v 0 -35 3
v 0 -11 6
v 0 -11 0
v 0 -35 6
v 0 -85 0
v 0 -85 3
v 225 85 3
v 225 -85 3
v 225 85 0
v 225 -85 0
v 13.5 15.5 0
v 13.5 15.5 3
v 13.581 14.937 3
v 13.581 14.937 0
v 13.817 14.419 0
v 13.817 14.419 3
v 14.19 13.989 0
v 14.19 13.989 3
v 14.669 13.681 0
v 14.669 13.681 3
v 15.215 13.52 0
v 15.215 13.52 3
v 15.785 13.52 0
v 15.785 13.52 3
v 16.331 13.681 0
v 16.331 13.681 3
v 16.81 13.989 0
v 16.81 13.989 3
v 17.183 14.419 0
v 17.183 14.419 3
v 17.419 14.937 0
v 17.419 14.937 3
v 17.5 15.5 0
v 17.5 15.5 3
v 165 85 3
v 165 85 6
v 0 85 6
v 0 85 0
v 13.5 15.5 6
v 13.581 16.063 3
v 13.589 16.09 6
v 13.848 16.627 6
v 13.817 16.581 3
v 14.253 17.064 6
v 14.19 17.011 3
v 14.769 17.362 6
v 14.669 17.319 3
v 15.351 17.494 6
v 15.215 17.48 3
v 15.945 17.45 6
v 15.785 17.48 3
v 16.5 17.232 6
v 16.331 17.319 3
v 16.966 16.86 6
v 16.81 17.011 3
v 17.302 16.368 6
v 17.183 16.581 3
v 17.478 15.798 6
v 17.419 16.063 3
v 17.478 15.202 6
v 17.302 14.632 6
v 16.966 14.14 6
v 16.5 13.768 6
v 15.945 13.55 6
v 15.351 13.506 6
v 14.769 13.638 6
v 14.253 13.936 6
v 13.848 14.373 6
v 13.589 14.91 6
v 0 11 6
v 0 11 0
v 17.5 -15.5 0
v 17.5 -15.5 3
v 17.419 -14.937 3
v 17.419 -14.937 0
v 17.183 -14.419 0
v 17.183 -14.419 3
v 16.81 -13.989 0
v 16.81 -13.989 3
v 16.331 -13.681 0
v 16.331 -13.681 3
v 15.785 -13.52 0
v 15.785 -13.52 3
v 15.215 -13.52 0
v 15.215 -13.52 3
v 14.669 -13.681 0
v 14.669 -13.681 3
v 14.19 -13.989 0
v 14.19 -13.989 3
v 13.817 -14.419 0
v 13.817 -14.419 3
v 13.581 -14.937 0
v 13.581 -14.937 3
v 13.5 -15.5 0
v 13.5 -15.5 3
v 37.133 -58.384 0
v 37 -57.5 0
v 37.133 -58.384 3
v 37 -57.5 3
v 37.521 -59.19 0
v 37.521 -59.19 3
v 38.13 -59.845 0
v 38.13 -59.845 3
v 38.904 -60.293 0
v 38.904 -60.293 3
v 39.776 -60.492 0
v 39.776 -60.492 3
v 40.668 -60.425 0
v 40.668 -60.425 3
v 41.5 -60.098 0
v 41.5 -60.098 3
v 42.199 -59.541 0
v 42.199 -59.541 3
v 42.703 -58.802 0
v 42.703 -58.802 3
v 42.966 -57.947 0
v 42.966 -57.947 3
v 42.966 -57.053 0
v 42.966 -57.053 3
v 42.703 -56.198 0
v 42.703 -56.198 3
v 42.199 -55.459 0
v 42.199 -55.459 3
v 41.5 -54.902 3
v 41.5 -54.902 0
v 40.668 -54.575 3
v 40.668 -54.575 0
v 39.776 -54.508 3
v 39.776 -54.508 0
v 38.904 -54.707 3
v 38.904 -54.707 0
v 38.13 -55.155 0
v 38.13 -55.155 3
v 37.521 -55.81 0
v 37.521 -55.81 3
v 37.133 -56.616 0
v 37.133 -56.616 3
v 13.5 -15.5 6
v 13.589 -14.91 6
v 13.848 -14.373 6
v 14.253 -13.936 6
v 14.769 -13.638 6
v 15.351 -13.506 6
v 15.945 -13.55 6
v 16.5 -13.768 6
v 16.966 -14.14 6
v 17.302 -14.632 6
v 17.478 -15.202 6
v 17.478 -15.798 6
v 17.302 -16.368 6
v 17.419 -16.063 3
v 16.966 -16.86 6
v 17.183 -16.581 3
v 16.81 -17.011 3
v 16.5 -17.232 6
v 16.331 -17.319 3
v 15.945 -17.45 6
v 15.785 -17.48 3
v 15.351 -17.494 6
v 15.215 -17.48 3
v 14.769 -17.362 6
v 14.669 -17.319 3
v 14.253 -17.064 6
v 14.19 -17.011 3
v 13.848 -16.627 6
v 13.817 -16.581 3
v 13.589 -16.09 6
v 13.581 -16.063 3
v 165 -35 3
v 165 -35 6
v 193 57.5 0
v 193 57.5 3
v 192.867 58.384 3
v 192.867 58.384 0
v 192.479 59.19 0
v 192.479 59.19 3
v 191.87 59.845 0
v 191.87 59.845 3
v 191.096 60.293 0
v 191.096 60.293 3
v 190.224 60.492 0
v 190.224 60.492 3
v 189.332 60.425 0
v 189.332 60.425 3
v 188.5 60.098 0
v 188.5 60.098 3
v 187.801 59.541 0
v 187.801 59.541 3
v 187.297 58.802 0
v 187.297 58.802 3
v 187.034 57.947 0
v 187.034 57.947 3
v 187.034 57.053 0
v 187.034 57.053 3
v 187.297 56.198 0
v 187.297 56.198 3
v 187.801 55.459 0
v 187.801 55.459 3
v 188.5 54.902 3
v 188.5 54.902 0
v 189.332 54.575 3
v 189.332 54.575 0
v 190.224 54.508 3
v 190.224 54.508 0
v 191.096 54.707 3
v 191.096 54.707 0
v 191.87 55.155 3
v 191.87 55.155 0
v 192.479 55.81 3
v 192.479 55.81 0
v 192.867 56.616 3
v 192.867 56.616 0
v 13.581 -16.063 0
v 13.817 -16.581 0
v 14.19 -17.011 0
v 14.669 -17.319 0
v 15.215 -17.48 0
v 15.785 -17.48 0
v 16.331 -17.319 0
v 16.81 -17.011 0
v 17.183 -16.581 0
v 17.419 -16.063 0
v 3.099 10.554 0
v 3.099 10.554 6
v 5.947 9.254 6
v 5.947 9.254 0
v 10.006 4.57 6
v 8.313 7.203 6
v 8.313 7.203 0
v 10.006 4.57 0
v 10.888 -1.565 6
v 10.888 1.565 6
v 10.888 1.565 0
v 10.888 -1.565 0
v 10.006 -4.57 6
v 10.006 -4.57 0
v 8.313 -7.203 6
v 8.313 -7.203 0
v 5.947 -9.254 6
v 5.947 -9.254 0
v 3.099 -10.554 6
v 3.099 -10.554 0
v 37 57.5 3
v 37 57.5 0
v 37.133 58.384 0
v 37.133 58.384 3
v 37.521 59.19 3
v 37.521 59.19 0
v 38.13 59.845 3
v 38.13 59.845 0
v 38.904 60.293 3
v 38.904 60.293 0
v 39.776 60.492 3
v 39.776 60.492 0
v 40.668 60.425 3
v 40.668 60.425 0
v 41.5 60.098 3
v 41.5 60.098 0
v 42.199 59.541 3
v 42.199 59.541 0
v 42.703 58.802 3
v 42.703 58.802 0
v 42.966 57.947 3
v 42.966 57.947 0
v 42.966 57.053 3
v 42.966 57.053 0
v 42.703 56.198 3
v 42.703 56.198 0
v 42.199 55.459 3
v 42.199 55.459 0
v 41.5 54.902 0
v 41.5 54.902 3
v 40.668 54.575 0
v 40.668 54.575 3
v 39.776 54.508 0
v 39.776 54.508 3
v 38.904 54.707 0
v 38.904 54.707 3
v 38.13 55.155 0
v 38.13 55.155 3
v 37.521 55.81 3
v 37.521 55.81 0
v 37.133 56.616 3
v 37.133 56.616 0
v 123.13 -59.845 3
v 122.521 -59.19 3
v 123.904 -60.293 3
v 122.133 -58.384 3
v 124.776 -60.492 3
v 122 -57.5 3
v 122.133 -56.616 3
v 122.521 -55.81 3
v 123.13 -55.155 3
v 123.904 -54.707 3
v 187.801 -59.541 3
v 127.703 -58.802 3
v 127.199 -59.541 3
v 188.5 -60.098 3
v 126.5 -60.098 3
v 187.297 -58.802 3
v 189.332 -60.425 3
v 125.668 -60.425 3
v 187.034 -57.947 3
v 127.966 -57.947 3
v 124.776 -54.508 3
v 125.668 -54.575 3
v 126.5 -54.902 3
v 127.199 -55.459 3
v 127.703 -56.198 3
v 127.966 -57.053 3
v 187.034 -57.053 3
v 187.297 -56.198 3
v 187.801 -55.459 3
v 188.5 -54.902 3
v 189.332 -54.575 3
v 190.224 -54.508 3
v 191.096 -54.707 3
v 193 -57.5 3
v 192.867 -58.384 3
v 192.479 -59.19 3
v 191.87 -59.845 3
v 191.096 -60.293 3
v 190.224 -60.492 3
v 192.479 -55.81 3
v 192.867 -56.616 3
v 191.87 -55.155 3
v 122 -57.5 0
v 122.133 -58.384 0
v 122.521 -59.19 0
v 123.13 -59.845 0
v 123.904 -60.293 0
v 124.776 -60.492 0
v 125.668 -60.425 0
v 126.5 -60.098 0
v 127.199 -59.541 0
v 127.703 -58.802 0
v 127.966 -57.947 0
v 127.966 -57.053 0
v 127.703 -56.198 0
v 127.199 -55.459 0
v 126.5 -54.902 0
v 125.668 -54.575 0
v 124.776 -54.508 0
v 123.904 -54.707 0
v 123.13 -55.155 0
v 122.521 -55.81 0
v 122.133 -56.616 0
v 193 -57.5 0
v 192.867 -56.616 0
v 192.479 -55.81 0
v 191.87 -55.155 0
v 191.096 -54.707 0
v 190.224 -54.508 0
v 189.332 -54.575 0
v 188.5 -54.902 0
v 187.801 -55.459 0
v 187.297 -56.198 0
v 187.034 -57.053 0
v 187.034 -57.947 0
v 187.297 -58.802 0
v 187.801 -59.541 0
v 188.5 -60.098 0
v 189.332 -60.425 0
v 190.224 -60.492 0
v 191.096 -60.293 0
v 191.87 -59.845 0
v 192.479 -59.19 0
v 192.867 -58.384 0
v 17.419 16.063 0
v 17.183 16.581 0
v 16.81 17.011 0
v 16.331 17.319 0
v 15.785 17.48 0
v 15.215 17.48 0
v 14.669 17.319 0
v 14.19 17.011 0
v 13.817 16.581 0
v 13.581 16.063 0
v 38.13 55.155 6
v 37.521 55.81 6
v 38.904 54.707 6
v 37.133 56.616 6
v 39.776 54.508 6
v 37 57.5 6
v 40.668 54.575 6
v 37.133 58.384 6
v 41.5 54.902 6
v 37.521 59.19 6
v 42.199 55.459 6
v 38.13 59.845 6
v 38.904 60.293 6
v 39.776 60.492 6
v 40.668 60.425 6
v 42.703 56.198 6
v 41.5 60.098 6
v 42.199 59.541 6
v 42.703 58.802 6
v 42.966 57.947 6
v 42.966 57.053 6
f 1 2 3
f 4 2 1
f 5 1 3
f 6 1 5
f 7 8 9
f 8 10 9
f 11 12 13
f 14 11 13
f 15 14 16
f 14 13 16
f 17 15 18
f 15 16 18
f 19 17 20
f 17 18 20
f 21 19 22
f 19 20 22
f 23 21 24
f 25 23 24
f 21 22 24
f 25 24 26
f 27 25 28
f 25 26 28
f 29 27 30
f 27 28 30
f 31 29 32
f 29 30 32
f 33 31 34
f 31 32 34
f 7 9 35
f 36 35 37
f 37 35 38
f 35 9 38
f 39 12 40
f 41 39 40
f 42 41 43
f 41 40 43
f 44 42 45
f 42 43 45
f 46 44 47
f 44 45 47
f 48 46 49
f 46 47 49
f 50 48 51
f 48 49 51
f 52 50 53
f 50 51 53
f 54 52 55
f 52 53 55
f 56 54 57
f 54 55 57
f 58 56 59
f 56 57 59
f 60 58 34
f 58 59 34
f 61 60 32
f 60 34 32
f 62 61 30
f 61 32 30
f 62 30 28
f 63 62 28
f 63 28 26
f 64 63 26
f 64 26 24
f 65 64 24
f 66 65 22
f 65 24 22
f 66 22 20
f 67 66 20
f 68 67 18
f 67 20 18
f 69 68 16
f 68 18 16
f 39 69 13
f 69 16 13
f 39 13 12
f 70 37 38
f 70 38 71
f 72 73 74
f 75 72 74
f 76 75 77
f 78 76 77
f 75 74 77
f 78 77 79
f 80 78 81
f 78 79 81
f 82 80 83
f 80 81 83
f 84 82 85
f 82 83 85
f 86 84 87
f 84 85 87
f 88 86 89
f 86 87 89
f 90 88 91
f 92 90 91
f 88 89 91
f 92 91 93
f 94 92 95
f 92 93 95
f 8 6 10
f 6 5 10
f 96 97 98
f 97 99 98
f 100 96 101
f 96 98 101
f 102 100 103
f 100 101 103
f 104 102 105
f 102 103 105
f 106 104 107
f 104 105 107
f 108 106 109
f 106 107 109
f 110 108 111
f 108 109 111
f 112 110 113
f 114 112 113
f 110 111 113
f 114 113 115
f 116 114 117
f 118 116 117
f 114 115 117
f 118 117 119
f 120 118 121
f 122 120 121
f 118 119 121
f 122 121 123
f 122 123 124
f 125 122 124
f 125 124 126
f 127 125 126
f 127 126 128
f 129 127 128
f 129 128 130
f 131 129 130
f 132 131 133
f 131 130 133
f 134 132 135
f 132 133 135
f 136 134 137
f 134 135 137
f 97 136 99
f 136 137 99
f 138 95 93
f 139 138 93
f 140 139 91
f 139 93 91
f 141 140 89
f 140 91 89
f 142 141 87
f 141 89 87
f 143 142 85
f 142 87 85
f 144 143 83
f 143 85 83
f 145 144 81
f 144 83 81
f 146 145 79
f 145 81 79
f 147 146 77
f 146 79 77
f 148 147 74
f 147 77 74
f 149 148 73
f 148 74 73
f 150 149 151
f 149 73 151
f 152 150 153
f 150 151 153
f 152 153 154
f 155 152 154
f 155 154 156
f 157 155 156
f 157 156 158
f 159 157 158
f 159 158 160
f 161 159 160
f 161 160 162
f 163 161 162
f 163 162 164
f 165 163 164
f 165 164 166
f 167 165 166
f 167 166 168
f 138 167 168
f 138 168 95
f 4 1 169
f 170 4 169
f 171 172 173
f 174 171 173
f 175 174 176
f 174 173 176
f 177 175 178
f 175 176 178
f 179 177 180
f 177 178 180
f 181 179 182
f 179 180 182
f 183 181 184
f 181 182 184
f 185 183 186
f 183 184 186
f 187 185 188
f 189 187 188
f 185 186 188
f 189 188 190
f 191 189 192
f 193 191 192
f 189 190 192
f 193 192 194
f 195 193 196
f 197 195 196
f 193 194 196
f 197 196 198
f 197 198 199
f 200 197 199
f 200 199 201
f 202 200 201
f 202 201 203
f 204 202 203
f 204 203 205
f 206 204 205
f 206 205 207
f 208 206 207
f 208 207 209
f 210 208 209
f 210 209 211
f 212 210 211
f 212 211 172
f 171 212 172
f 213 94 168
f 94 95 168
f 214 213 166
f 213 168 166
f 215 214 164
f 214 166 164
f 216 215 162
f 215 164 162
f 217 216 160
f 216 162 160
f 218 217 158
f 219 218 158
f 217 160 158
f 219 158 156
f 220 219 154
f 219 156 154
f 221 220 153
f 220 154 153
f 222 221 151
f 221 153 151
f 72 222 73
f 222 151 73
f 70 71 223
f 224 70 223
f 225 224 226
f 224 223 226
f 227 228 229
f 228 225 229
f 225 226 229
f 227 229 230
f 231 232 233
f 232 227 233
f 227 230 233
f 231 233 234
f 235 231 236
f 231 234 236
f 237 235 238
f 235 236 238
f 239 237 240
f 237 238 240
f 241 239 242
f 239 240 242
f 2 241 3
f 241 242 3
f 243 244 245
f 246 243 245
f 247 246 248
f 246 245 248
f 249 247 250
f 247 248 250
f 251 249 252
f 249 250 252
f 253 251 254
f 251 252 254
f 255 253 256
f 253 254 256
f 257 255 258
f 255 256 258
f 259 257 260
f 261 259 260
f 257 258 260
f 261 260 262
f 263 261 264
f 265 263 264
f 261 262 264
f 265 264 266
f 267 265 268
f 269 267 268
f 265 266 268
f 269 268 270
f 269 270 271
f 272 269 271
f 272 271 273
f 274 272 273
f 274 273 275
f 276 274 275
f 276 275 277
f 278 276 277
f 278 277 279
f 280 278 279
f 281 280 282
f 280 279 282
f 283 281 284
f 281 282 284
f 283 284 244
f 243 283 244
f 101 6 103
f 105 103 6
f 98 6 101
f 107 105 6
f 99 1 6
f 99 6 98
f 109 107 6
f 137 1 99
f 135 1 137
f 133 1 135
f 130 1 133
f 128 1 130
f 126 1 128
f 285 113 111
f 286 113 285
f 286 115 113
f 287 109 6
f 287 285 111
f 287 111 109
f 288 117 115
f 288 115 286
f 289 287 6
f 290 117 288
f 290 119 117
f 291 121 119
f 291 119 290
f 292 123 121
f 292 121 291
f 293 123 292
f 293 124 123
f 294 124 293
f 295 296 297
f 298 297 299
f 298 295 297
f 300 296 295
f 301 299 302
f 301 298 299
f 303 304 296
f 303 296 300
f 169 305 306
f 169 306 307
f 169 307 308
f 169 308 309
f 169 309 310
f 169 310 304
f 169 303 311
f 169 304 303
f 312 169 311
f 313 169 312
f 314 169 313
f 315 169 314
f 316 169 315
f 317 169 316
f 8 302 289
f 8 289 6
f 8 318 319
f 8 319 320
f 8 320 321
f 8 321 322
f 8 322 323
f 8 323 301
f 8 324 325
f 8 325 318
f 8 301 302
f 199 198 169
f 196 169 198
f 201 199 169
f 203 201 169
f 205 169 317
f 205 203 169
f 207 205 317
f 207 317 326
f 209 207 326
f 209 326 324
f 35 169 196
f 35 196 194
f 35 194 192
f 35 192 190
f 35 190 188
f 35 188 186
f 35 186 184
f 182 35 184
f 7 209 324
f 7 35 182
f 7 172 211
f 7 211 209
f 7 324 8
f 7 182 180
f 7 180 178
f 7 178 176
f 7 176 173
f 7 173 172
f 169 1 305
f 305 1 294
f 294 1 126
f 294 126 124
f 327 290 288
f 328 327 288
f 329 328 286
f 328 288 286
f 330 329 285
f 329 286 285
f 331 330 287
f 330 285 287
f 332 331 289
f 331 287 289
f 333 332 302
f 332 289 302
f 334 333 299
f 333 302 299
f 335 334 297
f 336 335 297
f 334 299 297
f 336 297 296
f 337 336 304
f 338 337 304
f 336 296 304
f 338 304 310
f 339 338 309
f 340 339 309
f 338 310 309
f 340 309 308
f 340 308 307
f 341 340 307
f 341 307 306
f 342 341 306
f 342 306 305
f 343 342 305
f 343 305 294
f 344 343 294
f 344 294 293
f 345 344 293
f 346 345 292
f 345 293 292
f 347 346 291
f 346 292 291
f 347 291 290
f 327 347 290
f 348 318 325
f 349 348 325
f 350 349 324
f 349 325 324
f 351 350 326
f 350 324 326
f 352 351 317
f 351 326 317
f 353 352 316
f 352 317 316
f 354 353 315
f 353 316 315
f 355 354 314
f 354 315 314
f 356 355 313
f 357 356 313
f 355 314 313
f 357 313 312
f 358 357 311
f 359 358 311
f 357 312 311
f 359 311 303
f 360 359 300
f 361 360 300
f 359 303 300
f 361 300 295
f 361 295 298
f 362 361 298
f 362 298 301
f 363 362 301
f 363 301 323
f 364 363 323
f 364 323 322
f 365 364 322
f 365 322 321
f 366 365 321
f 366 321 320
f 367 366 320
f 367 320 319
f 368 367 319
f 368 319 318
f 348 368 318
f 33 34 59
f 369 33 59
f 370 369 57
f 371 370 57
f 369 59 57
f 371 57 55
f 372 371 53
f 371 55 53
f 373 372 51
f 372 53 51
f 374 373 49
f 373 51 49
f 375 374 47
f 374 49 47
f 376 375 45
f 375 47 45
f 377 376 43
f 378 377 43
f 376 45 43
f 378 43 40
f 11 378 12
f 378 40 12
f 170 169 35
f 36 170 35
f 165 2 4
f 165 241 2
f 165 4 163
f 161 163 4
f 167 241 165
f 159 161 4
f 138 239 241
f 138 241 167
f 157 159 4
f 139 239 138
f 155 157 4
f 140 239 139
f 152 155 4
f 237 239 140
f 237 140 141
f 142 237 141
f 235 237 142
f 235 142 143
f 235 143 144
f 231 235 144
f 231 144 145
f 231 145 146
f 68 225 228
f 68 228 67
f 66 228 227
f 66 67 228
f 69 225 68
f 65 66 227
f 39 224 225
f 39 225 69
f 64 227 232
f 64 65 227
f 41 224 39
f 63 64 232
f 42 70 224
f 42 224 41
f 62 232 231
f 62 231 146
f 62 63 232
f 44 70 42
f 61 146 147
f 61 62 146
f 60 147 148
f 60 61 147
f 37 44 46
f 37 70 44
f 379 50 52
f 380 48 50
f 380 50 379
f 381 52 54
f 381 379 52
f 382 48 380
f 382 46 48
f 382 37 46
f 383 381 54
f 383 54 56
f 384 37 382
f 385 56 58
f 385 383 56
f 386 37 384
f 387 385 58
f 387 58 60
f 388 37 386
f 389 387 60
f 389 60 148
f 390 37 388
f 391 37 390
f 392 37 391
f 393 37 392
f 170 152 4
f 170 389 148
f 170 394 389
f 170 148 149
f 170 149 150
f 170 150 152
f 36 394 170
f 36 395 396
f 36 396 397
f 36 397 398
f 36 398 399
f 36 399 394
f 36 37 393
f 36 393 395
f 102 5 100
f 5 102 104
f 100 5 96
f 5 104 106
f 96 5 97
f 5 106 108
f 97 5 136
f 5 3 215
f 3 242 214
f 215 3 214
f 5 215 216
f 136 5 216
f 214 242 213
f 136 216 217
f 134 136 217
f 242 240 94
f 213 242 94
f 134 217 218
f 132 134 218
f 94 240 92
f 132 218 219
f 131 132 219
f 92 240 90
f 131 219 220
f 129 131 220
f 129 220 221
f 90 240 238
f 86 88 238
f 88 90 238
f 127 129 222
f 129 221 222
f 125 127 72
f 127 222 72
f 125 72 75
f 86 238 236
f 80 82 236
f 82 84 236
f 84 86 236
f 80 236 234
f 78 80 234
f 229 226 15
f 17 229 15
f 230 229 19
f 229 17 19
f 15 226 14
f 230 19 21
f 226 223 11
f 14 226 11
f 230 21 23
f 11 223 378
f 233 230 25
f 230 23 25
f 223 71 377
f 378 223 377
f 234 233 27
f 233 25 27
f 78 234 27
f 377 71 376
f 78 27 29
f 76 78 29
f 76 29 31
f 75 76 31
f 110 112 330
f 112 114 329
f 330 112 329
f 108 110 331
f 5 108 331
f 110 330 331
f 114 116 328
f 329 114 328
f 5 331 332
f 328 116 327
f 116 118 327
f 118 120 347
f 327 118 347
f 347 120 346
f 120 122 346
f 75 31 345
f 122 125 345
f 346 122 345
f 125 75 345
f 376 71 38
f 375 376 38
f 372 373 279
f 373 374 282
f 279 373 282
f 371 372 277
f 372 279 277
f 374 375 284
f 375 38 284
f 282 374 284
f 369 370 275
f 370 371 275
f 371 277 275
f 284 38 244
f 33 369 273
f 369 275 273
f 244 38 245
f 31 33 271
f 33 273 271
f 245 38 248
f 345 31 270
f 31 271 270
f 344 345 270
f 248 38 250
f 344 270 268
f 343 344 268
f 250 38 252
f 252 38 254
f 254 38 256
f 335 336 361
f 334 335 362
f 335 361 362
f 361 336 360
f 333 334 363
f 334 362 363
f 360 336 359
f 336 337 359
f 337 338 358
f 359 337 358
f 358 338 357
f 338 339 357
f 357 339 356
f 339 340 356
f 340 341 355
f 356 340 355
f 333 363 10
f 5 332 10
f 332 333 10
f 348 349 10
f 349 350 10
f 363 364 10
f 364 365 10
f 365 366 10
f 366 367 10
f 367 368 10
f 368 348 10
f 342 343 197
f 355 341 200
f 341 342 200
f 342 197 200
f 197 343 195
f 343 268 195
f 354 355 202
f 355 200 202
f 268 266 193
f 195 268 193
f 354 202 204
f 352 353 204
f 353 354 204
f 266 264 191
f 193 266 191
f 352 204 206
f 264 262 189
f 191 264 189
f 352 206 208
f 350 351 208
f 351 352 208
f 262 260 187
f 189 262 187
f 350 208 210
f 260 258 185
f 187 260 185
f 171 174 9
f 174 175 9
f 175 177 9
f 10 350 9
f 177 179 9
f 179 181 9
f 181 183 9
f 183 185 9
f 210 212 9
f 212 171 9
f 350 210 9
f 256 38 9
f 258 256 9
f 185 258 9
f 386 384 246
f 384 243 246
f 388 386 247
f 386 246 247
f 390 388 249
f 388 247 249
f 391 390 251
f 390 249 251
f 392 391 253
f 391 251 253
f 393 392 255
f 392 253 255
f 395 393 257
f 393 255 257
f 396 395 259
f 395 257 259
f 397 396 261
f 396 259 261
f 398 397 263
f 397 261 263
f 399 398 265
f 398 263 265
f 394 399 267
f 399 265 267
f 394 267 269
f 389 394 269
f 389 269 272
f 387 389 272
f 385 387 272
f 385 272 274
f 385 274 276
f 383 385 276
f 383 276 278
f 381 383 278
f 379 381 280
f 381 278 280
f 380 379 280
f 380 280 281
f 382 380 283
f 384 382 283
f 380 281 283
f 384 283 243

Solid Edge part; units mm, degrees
sketch "Sketch1" plane through (0, 0, 0) normal (0, 0, 1) x (1, 0, 0)
  line L0 (-225, -85) -> (225, -85)
  line L1 (225, -85) -> (225, 85)
  line L2 (225, 85) -> (-225, 85)
  line L3 (-225, 85) -> (-225, -85)
  dimension "D1" = 450
  dimension "D2" = 170
extrude "Protrusion1" add sketch "Sketch1" along normal blind 3
sketch "Sketch2" plane through (0, 0, 3) normal (0, 0, 1) x (1, 0, 0)
  circle A0 centre (-190, 57.5) radius 3
  circle A1 centre (-190, -57.5) radius 3
  circle A2 centre (190, -57.5) radius 3
  circle A3 centre (190, 57.5) radius 3
  dimension "D1" = 380
  dimension "D2" = 115
  dimension "D3" = 6
extrude "Cutout1" cut sketch "Sketch2" against normal through all
sketch "Sketch3" plane through (0, 0, 3) normal (0, 0, 1) x (1, 0, 0)
  circle A0 centre (-15.5, 15.5) radius 2
  circle A1 centre (15.5, 15.5) radius 2
  circle A2 centre (15.5, -15.5) radius 2
  circle A3 centre (-15.5, -15.5) radius 2
  dimension "D1" = 31
  dimension "D2" = 4
extrude "Cutout2" cut sketch "Sketch3" against normal through all
sketch "Sketch4" plane through (-112.5, 0, 3) normal (0, 0, 1) x (1, 0, 0)
  circle A0 centre (-12.5, -57.5) radius 3
  dimension "D1" = 125
extrude "Cutout3" cut sketch "Sketch4" against normal through all
sketch "Sketch5" plane through (-112.5, 0, 3) normal (0, 0, 1) x (1, 0, 0)
  line L0 (112.5, 85) -> (-52.5, 85)
  line L1 (-52.5, 85) -> (-52.5, -35)
  line L2 (-52.5, -35) -> (112.5, -35)
  line L3 (112.5, -35) -> (112.5, 85)
  dimension "D1" = 120
  dimension "D2" = 165
extrude "Extrusionsausprägung_2" add sketch "Sketch5" along normal blind 3
sketch "Sketch6" plane through (-112.5, 0, 3) normal (0, 0, 1) x (1, 0, 0)
  circle A0 centre (72.5, 57.5) radius 3
  circle A1 centre (72.5, -57.5) radius 3
extrude "Cutout4" cut sketch "Sketch6" against normal through all
sketch "Sketch7" plane through (-112.5, 0, 0) normal (0, 0, -1) x (1, 0, 0)
  circle A0 centre (72.5, -57.5) radius 3
  circle A1 centre (97, 15.5) radius 2
  circle A2 centre (97, -15.5) radius 2
extrude "Cutout5" cut sketch "Sketch7" against normal through all
mirror "Mirror1" about plane through (0, 0, 0) normal (1, 0, 0) of "Extrusionsausprägung_2", "Cutout3"
mirror "Mirror2" about plane through (0, 0, 0) normal (1, 0, 0) of "Extrusionsausprägung_2", "Cutout3", "Cutout1"
mirror "Mirror3" about plane through (0, 0, 0) normal (1, 0, 0) of "Cutout5", "Cutout4"
sketch "Sketch8" plane through (0, 25, 6) normal (0, 0, 1) x (1, 0, 0)
  line L0 (0, 60) -> (0, -110)
extrude "Cutout8" cut sketch "Sketch8" against normal through all material side at (-0.05, 0, 6)
sketch "Sketch9" plane through (112.5, 0, 0) normal (0, 0, -1) x (1, 0, 0)
  circle A0 centre (-112.5, 0) radius 11
extrude "Cutout9" cut sketch "Sketch9" against normal through all
properties material "Nylon, allgemein"
